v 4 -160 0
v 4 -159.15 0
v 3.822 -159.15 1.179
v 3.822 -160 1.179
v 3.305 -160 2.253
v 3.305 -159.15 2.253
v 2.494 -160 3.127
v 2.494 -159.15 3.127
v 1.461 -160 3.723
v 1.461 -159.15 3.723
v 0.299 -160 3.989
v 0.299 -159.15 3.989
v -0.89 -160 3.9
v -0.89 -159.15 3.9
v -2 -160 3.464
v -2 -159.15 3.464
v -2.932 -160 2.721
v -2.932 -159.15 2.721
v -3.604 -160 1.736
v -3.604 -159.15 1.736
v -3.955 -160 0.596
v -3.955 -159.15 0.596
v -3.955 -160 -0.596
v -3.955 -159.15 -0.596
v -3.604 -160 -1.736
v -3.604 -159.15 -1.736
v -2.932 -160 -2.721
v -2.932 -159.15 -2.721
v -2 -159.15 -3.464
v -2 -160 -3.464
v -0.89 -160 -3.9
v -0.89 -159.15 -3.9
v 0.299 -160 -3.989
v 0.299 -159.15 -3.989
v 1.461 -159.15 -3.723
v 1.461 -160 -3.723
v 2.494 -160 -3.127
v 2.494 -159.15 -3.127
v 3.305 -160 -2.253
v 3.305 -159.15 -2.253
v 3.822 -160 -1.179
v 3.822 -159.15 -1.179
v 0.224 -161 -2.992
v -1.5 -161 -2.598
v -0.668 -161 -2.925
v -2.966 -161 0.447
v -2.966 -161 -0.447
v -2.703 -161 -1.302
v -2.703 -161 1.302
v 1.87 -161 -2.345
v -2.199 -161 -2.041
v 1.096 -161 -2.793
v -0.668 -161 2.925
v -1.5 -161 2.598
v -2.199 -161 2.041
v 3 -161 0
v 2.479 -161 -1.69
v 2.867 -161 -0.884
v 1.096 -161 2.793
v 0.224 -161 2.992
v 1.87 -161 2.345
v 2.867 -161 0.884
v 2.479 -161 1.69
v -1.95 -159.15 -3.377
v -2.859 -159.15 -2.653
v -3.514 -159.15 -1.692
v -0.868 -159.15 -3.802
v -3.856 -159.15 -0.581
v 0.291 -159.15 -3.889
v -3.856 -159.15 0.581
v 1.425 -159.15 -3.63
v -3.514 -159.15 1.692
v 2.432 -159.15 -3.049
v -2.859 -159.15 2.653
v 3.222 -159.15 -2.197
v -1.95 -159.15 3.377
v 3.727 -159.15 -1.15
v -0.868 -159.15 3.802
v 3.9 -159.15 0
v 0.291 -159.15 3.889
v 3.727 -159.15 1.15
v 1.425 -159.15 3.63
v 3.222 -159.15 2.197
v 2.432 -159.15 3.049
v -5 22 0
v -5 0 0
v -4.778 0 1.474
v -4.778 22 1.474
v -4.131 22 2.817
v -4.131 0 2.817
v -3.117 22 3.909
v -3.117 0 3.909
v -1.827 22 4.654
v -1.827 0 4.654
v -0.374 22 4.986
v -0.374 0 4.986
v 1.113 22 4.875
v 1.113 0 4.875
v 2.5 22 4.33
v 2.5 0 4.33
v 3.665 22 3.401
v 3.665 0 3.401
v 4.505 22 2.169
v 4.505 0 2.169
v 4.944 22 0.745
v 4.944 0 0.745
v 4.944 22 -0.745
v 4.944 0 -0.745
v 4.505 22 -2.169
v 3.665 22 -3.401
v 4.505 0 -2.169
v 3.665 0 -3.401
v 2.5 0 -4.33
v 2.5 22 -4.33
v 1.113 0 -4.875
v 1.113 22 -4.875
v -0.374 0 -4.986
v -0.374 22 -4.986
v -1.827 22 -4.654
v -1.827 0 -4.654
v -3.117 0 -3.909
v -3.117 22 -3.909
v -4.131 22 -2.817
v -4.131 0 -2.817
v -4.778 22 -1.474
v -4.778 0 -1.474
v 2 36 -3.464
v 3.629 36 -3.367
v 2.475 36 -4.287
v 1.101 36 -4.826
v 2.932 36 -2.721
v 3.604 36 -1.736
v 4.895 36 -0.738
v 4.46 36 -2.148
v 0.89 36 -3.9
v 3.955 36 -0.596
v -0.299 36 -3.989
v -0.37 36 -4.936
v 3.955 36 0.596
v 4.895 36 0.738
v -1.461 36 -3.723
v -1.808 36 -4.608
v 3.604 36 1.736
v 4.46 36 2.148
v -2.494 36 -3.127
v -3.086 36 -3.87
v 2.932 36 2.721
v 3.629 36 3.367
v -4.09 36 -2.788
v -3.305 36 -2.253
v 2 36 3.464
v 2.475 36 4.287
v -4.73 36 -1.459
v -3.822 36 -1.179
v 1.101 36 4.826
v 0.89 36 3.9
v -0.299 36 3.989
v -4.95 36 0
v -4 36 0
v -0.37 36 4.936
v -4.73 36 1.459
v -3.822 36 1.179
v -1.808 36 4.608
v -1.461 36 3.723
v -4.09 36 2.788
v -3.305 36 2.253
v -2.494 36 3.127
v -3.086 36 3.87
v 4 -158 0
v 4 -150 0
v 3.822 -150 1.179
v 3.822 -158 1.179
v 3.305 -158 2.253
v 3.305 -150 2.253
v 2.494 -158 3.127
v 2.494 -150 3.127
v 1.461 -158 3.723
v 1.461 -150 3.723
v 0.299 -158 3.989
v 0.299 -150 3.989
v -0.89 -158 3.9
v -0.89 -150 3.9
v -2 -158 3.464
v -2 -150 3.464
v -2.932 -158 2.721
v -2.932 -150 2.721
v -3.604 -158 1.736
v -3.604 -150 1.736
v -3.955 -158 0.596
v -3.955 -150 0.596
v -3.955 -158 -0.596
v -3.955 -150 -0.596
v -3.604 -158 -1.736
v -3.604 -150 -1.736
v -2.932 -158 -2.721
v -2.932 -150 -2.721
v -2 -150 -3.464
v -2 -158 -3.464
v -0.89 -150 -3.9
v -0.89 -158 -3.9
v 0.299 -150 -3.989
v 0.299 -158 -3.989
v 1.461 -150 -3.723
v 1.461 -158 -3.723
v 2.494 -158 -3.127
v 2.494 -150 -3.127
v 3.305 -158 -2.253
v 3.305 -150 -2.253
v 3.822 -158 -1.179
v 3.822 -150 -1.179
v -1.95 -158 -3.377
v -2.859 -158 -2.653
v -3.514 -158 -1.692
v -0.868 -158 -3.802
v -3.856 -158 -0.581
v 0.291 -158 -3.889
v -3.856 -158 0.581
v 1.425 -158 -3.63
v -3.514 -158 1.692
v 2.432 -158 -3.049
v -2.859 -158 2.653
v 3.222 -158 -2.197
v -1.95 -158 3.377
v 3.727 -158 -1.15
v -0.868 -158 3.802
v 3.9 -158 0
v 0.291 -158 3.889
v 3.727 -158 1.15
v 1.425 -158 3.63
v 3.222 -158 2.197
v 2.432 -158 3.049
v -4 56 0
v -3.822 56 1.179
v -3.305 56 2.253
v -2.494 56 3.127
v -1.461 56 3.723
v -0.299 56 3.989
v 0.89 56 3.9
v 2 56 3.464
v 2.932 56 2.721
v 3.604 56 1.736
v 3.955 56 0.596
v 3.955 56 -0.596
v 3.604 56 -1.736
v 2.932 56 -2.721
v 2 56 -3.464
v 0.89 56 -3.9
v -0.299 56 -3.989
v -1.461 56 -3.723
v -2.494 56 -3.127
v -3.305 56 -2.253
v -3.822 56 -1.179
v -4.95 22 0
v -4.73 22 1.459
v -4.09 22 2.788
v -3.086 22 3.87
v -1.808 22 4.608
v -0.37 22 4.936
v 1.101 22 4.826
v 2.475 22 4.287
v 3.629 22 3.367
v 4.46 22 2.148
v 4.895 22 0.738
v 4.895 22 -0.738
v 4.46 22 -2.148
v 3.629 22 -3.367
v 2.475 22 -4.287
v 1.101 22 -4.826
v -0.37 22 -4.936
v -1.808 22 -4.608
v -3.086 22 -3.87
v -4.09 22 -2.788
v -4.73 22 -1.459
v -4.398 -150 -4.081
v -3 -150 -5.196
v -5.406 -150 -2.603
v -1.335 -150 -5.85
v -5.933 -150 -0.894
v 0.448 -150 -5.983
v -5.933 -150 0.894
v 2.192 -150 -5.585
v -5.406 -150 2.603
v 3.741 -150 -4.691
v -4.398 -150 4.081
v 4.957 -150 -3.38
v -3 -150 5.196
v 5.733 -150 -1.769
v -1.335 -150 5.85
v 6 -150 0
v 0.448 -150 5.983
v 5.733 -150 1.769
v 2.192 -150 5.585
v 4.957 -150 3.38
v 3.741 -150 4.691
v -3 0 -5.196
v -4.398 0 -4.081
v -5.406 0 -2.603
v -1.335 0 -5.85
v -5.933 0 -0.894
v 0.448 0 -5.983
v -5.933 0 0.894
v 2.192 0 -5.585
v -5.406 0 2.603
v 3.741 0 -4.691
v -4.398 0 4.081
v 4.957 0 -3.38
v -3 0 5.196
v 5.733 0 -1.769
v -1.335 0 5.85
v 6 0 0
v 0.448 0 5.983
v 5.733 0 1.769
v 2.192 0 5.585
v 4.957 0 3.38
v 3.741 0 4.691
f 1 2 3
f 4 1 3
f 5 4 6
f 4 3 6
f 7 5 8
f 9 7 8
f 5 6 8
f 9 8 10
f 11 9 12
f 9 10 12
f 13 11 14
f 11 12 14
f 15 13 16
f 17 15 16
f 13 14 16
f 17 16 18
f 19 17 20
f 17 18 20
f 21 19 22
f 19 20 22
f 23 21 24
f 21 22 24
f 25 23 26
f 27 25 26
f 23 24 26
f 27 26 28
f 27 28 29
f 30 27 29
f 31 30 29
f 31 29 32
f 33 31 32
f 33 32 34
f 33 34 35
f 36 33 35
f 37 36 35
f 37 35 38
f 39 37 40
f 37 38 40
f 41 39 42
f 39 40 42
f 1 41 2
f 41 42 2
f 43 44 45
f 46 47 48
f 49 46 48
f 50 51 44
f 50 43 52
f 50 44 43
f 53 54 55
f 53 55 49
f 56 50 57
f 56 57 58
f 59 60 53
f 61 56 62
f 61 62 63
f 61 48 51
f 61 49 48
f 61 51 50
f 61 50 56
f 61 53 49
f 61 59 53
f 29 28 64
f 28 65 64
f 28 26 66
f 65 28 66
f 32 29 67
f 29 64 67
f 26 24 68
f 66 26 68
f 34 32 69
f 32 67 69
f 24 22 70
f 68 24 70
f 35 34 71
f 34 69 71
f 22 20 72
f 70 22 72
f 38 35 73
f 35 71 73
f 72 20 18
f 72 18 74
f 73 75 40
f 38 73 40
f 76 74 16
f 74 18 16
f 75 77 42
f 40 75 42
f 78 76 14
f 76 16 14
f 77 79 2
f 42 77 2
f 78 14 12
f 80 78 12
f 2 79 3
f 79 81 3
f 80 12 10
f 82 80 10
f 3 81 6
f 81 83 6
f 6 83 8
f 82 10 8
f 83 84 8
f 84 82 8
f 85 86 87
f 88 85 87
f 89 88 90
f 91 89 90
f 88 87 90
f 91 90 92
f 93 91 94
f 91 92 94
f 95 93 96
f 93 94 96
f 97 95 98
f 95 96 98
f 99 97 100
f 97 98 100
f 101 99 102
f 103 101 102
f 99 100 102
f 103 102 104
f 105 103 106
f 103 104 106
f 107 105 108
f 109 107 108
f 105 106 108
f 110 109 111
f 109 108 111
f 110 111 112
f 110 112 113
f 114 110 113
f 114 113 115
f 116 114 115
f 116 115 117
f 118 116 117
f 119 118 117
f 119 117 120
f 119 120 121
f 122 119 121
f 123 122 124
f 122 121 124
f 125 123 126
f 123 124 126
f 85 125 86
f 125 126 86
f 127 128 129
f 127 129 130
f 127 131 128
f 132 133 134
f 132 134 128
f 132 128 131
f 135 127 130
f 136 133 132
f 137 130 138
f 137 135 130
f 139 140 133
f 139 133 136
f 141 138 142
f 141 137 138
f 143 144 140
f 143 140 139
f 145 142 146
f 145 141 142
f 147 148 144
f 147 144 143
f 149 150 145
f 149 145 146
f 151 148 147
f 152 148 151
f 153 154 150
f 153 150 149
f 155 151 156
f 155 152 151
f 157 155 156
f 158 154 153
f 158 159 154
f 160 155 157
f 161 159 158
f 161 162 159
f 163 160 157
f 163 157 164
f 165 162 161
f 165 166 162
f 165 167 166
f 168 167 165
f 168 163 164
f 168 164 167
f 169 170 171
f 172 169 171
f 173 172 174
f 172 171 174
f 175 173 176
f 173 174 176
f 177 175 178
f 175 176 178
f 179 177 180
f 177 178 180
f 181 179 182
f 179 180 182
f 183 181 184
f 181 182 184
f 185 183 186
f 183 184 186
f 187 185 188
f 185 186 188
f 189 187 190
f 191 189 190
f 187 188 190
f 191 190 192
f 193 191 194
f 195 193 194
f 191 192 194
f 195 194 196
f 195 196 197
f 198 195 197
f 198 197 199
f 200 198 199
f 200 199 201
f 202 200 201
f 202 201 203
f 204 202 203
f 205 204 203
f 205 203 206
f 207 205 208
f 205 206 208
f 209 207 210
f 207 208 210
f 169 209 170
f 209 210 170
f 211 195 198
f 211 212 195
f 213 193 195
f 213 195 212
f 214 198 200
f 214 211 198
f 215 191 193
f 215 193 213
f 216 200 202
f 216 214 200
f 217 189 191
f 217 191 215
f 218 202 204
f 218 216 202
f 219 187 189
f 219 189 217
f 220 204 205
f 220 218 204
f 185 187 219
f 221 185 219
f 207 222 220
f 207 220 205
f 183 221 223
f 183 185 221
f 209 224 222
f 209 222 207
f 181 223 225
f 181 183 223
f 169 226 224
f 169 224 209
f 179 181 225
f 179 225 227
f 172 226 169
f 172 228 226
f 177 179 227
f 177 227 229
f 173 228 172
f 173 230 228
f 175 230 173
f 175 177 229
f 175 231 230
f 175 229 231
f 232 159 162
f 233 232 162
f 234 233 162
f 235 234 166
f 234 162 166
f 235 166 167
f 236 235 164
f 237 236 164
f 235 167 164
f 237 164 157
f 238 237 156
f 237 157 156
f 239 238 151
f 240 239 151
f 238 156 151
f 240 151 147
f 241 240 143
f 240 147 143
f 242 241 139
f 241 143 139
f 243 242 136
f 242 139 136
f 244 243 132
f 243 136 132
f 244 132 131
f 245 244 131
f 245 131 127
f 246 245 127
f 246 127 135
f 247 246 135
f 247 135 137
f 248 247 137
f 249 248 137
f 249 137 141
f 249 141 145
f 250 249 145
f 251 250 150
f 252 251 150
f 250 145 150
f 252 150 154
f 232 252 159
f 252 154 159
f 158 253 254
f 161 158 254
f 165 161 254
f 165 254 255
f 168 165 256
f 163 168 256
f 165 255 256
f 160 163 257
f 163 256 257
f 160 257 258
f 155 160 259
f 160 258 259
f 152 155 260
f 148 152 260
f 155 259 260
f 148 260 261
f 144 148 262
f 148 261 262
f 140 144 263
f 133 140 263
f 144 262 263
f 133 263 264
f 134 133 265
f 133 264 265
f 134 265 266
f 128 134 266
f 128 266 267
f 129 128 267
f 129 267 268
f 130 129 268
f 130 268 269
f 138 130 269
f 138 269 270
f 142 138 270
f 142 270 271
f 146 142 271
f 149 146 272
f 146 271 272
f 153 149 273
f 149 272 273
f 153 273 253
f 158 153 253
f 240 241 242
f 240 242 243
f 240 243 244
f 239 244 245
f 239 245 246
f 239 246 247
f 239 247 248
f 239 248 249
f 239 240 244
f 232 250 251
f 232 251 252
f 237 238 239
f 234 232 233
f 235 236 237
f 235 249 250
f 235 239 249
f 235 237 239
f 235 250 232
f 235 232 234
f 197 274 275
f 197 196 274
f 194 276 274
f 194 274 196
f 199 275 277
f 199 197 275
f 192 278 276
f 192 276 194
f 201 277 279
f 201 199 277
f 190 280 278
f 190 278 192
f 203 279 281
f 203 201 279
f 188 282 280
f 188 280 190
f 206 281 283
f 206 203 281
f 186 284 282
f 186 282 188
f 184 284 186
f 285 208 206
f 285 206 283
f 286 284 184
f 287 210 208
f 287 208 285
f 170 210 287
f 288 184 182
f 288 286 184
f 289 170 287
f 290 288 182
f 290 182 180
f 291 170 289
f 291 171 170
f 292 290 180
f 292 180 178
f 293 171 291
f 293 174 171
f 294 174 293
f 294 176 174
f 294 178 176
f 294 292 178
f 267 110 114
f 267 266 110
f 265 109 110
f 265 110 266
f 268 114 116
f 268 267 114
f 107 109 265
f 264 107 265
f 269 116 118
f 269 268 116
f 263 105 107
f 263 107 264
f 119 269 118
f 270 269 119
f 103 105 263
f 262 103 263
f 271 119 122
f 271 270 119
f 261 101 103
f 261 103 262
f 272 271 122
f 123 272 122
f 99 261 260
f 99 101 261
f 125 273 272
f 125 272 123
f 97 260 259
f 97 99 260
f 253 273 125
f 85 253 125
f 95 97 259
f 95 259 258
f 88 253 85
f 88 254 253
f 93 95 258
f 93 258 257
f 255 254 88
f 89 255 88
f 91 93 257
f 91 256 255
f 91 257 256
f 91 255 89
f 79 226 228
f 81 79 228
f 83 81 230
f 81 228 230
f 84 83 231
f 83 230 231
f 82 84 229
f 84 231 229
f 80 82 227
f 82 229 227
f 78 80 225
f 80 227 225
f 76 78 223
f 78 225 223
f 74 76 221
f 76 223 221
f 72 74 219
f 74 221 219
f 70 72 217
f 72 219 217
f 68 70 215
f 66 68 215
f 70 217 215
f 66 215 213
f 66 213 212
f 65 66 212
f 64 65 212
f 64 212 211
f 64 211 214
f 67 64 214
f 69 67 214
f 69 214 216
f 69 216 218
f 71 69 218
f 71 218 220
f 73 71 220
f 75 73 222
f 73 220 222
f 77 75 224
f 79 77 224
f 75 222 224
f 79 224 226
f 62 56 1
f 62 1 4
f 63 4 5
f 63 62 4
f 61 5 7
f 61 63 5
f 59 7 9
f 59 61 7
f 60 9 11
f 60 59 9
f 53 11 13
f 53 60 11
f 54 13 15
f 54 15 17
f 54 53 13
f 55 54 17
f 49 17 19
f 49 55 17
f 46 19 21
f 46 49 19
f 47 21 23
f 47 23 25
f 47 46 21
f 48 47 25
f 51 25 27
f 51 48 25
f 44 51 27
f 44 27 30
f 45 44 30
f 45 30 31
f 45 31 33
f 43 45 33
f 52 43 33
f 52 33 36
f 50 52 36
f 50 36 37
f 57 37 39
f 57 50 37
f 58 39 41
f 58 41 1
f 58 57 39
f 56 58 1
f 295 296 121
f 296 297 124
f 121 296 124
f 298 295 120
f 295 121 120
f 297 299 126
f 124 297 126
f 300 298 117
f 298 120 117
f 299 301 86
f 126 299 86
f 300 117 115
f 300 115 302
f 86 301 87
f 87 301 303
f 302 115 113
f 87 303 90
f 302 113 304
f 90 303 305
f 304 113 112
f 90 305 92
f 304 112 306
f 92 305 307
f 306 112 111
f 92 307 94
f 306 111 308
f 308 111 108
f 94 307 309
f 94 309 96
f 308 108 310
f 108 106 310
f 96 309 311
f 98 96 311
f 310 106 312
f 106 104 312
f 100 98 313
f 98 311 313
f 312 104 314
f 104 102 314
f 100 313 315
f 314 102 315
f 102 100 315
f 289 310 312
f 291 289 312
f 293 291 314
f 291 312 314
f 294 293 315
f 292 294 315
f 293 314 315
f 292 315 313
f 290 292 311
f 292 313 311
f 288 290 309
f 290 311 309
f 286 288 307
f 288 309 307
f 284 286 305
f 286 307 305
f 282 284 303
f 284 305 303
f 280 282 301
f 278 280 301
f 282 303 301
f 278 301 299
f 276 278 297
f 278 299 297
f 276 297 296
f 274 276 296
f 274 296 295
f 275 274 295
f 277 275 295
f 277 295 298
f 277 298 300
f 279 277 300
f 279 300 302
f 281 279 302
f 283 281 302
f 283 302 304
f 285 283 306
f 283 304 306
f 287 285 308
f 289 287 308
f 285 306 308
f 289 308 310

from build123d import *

# Parameters (mm, degrees)
F0_R      = 6
F1_DEPTH  = 150
F2_R      = 5
F3_DEPTH  = 22
F4_R      = 4.95
F5_DEPTH  = 14
F6_R      = 4
F7_DEPTH  = 20
F8_R      = 4
F9_DEPTH  = 8
F10_R     = 3.9
F11_DEPTH = 1.15
F12_R     = 4
F13_DEPTH = 1.85
F14_SIZE  = 1


with BuildPart() as f1:
    # F0 (on Front) → F1 (new body)
    with BuildSketch(Plane.XZ):
        Circle(F0_R)
    extrude(amount=F1_DEPTH)

    # F2 (on face) → F3 (join)
    with BuildSketch(Plane(origin=(0, 0, 0), x_dir=(-1, 0, 0), z_dir=(0, 1, 0))):
        Circle(F2_R)
    extrude(amount=F3_DEPTH)

    # F4 (on face) → F5 (join)
    with BuildSketch(Plane(origin=(0, 22, 0), x_dir=(-1, 0, 0), z_dir=(0, 1, 0))):
        Circle(F4_R)
    extrude(amount=F5_DEPTH)

    # F6 (on face) → F7 (join)
    with BuildSketch(Plane(origin=(0, 36, 0), x_dir=(-1, 0, 0), z_dir=(0, 1, 0))):
        Circle(F6_R)
    extrude(amount=F7_DEPTH)

    # F8 (on face) → F9 (join)
    with BuildSketch(Plane.XZ.offset(150)):
        Circle(F8_R)
    extrude(amount=F9_DEPTH)

    # F10 (on face) → F11 (join)
    with BuildSketch(Plane.XZ.offset(158)):
        Circle(F10_R)
    extrude(amount=F11_DEPTH)

    # F12 (on face) → F13 (join)
    with BuildSketch(Plane.XZ.offset(159.15)):
        Circle(F12_R)
    extrude(amount=F13_DEPTH)

    # F14
    f14_edges = [f1.edges().sort_by_distance(p)[0] for p in [
        (-4, -161, 0),
    ]]
    chamfer(f14_edges, length=F14_SIZE)


solid = f1.part
